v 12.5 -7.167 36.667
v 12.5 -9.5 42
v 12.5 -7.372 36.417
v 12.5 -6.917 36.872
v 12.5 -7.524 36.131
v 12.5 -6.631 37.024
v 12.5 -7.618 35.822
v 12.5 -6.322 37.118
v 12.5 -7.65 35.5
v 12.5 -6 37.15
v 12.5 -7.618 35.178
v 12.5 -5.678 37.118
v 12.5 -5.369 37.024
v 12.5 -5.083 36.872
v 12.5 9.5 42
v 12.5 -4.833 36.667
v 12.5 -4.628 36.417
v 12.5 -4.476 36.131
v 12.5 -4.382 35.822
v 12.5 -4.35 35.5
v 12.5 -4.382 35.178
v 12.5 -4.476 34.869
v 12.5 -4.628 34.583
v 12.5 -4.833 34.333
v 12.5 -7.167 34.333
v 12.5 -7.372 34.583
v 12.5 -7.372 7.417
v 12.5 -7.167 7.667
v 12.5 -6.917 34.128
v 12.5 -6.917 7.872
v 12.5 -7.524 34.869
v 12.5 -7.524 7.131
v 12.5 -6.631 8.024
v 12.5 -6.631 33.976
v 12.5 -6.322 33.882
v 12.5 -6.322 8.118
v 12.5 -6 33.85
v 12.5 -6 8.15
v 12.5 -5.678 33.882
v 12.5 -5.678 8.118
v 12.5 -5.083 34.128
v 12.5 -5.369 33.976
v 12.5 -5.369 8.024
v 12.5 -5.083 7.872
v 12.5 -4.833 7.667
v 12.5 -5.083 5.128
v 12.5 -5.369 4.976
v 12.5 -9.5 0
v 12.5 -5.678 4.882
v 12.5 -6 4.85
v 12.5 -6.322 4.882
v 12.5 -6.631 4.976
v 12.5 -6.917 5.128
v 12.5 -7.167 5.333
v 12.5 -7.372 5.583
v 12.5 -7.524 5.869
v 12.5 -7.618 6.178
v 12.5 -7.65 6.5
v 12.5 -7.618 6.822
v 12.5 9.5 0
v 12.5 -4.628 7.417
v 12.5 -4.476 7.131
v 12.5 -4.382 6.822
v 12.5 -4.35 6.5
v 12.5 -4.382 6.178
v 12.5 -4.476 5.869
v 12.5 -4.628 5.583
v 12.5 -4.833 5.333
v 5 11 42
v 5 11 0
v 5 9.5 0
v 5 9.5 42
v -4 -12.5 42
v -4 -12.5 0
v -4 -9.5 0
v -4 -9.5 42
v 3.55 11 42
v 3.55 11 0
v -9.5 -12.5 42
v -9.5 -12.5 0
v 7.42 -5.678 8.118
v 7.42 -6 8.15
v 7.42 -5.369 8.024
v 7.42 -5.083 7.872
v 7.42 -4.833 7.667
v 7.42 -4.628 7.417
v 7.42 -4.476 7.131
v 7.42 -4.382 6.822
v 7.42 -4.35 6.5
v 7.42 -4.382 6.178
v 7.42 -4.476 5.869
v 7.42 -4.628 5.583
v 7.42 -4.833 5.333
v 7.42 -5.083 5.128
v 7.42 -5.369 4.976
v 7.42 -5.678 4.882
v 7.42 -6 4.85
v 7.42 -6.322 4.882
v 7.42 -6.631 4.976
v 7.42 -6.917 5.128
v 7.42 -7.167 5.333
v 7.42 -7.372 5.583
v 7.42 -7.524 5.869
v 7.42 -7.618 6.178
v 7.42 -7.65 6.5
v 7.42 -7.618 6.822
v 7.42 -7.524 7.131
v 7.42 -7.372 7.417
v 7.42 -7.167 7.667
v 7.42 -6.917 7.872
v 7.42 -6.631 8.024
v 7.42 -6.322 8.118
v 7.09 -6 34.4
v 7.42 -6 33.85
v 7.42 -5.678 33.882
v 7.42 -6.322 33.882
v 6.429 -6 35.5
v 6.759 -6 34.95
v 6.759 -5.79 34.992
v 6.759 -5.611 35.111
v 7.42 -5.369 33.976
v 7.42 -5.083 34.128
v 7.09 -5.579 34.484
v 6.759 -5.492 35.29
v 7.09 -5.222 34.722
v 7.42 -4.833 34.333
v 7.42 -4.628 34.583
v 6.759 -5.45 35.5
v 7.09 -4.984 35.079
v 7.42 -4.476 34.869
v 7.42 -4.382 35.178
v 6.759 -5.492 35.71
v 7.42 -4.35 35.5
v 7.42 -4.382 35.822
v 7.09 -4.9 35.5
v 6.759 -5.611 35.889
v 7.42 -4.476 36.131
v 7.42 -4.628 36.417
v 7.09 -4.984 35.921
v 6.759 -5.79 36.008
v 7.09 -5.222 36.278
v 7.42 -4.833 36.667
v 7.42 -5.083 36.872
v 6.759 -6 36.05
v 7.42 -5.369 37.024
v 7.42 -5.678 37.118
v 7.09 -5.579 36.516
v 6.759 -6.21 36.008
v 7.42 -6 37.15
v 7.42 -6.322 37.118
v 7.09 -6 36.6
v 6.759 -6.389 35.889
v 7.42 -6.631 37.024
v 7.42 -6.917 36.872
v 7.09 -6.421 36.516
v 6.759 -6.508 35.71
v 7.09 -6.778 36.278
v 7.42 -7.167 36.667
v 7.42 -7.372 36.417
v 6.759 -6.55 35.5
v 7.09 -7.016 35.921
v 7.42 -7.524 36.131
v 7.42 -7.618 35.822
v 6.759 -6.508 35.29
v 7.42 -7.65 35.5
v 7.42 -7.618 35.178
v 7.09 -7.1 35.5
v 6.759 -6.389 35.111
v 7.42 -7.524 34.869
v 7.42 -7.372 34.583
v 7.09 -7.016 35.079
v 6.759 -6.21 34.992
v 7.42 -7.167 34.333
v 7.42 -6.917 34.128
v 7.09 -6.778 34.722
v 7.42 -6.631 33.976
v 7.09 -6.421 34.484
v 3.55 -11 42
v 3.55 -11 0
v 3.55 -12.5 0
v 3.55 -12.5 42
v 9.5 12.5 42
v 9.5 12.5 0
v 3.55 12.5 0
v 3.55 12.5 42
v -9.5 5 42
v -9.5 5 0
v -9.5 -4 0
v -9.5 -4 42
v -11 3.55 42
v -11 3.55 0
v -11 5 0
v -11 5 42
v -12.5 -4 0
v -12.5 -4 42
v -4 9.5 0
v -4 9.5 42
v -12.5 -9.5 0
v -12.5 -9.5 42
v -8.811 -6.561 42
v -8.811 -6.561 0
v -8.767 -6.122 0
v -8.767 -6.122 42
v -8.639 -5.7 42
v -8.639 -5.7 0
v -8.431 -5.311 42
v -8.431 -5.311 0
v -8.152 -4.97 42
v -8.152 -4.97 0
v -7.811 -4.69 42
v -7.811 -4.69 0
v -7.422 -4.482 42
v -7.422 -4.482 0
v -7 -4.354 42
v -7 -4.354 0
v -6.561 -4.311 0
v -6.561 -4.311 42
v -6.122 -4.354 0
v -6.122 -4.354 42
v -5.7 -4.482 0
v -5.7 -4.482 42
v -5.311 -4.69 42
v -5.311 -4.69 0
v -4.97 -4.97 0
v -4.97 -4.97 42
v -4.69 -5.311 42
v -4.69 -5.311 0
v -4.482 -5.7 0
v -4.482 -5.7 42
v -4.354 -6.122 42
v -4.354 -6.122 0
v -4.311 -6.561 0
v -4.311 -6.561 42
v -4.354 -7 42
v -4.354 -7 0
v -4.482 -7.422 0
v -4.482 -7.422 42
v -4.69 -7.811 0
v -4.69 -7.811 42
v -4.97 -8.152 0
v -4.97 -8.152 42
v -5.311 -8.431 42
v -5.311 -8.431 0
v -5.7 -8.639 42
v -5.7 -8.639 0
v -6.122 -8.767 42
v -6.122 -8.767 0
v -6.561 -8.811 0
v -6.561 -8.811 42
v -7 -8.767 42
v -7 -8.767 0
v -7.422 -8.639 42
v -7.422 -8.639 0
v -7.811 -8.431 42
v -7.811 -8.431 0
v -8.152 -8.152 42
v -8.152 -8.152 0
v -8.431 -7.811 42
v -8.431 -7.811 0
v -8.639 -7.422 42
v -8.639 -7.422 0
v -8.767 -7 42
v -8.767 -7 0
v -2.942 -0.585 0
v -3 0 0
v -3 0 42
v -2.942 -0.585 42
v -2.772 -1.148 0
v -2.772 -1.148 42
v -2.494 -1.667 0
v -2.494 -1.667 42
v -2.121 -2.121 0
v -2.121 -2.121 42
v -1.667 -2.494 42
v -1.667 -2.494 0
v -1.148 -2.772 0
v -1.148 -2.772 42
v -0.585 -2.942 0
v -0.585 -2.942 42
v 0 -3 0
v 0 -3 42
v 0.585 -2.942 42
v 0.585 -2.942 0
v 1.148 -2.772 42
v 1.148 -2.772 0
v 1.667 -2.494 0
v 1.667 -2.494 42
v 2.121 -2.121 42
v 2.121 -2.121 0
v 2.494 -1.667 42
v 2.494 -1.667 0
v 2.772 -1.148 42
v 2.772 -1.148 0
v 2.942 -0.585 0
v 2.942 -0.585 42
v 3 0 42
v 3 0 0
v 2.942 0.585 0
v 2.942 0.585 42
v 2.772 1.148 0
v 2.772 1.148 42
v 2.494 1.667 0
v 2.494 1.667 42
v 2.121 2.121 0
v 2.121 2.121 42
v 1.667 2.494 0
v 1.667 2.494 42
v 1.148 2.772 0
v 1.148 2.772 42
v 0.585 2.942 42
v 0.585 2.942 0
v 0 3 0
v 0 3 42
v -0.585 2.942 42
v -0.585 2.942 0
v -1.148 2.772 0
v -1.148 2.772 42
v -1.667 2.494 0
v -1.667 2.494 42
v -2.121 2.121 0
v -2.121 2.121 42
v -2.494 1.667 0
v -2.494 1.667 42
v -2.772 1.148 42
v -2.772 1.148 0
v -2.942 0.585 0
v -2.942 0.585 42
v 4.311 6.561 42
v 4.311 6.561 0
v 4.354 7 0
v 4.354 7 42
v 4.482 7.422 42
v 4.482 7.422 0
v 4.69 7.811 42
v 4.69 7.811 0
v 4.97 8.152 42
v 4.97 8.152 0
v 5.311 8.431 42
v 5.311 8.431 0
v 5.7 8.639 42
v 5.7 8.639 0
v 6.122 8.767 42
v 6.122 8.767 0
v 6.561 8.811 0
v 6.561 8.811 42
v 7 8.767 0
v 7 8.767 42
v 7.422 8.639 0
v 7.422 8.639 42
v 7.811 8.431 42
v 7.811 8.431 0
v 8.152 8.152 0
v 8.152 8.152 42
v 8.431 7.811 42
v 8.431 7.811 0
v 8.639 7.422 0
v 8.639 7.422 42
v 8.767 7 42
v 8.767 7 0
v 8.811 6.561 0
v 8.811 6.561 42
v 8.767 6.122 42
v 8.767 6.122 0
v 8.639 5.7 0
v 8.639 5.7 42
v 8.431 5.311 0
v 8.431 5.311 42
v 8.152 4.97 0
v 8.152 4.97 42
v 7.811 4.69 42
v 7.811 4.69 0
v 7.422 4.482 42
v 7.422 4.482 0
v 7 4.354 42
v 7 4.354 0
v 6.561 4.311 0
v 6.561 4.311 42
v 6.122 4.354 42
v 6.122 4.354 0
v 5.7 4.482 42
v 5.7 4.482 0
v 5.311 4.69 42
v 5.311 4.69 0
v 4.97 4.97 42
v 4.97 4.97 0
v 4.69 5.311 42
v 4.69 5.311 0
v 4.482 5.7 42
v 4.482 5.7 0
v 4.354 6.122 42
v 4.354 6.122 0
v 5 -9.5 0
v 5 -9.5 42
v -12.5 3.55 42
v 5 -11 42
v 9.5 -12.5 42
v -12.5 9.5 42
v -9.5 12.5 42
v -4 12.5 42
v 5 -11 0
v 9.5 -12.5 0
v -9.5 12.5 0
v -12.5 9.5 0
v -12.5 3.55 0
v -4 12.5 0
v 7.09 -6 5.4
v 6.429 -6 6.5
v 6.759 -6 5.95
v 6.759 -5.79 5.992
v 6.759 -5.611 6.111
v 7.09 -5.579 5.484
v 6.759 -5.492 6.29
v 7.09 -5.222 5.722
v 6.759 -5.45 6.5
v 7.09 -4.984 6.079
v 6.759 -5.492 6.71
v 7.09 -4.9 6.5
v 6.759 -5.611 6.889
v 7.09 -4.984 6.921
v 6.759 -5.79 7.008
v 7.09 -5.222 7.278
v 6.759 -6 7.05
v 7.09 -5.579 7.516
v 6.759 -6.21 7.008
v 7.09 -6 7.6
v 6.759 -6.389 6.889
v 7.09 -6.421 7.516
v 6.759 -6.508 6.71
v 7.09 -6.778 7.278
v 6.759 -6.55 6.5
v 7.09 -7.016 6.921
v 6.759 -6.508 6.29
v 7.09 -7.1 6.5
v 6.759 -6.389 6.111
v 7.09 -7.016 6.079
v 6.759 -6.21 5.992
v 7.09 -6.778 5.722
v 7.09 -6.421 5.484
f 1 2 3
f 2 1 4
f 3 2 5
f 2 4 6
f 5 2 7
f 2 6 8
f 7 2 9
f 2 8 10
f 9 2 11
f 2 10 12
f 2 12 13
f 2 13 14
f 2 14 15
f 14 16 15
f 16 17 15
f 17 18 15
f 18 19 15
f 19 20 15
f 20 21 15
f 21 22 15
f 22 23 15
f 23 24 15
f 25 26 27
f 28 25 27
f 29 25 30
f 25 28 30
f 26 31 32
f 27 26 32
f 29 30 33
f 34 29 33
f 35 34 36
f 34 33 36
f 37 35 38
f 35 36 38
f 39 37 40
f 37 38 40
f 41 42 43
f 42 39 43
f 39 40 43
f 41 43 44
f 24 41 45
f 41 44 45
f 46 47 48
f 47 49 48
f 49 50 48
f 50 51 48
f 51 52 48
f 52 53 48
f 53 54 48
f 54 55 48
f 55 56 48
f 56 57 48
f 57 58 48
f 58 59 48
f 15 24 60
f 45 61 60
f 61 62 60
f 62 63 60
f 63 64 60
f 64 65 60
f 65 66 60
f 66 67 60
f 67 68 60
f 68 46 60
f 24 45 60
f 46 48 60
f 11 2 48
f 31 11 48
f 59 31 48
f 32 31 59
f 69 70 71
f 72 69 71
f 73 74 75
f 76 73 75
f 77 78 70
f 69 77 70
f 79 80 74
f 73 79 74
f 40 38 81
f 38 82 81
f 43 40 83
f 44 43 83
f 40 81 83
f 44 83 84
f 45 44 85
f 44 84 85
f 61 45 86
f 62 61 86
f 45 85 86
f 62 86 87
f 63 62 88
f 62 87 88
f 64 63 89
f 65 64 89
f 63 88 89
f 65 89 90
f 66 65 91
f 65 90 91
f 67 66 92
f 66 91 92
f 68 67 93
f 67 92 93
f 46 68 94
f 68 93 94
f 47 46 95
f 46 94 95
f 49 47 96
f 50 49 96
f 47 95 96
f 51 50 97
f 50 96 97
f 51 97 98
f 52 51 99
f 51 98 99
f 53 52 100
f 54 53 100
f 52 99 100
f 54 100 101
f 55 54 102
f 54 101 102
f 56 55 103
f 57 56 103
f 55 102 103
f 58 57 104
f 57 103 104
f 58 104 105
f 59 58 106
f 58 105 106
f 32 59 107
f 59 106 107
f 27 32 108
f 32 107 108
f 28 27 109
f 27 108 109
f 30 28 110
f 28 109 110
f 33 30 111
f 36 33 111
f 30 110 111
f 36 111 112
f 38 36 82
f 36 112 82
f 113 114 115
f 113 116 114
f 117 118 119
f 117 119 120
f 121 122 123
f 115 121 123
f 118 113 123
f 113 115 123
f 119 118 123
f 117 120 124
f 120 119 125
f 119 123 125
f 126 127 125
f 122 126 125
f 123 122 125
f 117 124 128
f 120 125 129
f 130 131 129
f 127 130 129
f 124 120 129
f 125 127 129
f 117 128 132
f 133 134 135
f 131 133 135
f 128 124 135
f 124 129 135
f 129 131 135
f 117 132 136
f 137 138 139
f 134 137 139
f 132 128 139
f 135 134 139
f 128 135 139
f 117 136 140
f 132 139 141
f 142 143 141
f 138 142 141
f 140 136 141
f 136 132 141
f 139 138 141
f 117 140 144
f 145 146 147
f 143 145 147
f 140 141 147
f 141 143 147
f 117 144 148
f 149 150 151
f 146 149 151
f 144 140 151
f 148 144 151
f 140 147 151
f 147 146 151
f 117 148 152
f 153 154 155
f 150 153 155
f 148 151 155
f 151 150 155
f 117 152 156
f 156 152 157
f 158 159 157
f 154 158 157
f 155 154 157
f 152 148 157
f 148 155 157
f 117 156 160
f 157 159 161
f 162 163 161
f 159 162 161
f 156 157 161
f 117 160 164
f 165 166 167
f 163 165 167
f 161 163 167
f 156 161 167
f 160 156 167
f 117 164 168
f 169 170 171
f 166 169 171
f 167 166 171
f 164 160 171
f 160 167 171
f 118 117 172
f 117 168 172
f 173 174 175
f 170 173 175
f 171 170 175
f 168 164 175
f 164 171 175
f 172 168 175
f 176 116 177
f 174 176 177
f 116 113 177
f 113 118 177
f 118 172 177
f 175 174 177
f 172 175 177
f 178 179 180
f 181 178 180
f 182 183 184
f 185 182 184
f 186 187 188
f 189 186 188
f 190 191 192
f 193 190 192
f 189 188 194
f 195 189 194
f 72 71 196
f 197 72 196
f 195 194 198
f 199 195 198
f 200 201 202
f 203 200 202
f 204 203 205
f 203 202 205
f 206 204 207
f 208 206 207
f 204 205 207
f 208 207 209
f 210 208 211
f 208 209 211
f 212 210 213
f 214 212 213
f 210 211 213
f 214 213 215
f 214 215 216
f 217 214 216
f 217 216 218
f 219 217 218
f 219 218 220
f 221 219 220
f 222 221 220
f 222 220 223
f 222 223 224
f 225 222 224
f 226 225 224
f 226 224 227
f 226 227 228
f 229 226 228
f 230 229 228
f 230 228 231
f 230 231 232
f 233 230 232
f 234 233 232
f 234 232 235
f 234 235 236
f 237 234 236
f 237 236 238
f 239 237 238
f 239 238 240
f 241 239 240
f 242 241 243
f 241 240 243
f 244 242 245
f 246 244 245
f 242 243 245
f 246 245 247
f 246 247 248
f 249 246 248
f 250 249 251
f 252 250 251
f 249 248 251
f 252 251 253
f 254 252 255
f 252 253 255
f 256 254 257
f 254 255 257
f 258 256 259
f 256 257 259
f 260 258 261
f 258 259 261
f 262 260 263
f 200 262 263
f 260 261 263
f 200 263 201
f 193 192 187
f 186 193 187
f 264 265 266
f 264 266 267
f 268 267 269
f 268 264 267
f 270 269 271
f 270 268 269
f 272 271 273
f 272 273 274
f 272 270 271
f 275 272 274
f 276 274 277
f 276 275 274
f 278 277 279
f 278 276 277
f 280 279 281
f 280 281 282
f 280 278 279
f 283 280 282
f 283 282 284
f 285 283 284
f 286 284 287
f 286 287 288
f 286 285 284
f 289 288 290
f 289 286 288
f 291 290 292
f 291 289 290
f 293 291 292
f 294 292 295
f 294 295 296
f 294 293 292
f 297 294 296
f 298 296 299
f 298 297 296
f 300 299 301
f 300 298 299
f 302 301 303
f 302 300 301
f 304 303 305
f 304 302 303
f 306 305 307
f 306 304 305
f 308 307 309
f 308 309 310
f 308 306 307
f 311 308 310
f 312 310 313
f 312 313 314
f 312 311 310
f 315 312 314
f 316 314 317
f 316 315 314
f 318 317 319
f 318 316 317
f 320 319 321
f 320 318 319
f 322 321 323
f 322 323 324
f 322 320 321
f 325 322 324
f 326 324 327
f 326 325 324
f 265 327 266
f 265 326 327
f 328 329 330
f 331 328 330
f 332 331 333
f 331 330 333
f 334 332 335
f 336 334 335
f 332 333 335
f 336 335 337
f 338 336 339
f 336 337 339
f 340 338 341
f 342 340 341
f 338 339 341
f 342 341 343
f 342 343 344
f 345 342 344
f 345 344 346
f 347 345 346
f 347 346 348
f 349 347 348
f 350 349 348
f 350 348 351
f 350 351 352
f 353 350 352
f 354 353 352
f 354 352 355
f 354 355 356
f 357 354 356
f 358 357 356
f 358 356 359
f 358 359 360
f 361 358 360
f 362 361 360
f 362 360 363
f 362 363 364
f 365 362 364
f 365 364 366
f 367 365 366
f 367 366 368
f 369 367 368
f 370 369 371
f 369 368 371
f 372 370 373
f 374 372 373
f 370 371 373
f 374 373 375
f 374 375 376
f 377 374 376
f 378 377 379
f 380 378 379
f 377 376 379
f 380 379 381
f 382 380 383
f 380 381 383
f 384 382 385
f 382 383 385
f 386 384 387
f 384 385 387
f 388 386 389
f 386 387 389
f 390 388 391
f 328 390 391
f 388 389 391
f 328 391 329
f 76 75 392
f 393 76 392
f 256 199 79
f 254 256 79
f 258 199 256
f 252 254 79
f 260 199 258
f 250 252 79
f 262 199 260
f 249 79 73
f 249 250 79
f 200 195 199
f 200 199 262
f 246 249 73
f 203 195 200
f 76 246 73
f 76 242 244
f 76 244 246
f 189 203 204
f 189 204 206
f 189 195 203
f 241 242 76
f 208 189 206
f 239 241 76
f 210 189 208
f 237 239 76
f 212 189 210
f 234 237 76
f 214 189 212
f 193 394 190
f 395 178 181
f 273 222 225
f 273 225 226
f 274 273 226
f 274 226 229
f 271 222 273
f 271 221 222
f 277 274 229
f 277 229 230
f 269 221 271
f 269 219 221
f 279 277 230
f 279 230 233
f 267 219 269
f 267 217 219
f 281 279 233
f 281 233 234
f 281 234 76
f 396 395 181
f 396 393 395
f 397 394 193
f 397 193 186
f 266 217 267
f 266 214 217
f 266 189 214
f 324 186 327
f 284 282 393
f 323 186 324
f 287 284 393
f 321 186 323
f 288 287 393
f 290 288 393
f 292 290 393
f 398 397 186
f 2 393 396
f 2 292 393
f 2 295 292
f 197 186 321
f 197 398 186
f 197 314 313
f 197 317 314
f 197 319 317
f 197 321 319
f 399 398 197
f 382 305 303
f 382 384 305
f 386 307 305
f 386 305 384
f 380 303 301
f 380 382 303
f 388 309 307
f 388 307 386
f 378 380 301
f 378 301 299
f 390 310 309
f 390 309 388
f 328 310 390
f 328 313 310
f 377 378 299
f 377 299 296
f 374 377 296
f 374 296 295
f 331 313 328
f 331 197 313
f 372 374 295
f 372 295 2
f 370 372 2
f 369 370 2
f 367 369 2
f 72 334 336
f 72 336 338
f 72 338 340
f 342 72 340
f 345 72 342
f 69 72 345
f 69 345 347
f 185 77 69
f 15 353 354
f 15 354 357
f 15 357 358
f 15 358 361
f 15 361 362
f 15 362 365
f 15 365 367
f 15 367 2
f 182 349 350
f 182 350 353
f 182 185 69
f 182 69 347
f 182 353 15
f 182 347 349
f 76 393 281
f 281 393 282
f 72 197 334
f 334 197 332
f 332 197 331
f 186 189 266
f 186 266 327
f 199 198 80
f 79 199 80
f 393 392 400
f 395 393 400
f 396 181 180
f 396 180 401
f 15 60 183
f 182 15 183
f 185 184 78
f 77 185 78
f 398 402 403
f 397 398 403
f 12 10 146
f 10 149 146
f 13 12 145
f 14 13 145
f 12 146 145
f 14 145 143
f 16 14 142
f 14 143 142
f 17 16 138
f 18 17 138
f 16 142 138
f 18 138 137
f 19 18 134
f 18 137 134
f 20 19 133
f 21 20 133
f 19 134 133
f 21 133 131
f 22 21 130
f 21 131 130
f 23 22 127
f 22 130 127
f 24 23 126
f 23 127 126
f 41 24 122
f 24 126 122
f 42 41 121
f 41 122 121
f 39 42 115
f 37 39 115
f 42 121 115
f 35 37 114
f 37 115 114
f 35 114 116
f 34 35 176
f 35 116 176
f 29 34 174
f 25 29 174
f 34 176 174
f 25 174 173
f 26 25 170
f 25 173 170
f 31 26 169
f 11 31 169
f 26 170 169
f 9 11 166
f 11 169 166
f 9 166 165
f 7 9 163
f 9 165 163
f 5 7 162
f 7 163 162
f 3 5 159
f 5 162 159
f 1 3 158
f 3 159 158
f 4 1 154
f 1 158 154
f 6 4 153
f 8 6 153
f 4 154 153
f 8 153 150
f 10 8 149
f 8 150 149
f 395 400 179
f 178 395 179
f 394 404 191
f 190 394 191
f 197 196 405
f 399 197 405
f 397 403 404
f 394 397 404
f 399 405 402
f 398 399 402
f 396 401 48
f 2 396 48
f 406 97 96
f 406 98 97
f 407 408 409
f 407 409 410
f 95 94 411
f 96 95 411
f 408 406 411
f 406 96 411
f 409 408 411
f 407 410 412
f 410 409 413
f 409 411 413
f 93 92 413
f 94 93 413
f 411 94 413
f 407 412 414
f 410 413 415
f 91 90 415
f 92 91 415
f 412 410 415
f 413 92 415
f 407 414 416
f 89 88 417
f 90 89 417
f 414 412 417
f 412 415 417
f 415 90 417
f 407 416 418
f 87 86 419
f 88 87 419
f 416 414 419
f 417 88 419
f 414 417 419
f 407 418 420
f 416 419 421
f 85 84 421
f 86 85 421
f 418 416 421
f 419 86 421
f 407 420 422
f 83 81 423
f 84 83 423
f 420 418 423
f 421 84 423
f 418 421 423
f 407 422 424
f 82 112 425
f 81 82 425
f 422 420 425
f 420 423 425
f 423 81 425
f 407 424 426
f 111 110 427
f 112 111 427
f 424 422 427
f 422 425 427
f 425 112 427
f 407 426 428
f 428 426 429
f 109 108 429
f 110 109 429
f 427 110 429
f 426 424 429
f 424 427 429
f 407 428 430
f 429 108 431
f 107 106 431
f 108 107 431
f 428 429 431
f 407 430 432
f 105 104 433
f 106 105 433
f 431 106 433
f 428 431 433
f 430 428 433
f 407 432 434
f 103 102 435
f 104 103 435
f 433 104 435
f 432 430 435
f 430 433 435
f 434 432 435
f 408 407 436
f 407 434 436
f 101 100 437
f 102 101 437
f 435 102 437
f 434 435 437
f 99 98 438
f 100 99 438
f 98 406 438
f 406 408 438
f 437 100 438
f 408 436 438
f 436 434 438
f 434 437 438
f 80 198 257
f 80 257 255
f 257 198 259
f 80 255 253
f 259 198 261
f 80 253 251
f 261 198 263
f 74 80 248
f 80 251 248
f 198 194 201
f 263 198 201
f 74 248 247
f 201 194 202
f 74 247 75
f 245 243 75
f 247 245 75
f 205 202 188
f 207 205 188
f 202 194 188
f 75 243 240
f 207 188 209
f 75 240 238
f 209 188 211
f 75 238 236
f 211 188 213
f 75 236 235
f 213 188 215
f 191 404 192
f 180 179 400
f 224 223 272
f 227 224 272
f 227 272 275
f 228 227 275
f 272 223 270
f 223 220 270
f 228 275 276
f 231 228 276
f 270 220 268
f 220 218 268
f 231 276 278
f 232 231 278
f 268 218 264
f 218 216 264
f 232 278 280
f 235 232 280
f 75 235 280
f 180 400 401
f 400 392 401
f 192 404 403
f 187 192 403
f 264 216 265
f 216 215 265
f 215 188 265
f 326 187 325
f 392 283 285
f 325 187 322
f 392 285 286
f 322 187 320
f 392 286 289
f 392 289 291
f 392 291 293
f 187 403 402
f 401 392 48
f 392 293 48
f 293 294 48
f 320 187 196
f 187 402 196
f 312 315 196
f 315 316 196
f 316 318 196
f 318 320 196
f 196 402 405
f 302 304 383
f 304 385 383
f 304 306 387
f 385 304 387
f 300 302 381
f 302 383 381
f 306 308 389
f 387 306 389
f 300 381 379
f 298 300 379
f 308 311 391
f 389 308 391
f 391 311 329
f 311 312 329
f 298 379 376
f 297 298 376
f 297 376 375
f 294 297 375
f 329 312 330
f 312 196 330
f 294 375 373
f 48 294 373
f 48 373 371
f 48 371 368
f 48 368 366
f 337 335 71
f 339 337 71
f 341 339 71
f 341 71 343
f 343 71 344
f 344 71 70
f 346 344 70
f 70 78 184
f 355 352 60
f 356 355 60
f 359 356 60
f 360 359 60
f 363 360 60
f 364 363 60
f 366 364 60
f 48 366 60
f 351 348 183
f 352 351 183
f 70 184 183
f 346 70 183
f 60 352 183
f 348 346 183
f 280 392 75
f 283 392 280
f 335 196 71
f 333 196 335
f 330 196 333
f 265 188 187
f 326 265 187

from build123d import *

# Parameters (mm, degrees)
SKETCH1_R                       = 3
BOSS_EXTRUDE1_DEPTH             = 42
M4_CLEARANCE_HOLE1_D            = 4.5
TAP_DRILL_FOR_M4X0_7_TAP1_D     = 3.3
TAP_DRILL_FOR_M4X0_7_TAP1_DEPTH = 5.08
TAP_DRILL_FOR_M4X0_7_TAP1_TIP   = 0.991420021


with BuildPart() as part:
    # Sketch1 → Boss-Extrude1 (new body)
    with BuildSketch(Plane.XY):
        Polygon((-12.5, -9.5), (-9.5, -12.5), (-4, -12.5), (-4, -9.5), (5, -9.5), (5, -11), (3.55, -11), (3.55, -12.5), (9.5, -12.5), (12.5, -9.5), (12.5, 9.5), (9.5, 12.5), (3.55, 12.5), (3.55, 11), (5, 11), (5, 9.5), (-4, 9.5), (-4, 12.5), (-9.5, 12.5), (-12.5, 9.5), (-12.5, 3.55), (-11, 3.55), (-11, 5), (-9.5, 5), (-9.5, -4), (-12.5, -4), align=None)
        with Locations(Location((0, 0, 0), (0, 0, 180))):
            Circle(SKETCH1_R, mode=Mode.SUBTRACT)
    extrude(amount=BOSS_EXTRUDE1_DEPTH)

    # M4 Clearance Hole1 (through all)
    with Locations(Plane.XY.offset(42)):
        with Locations((6.560660172, 6.560660172), (-6.560660172, -6.560660172)):
            Hole(M4_CLEARANCE_HOLE1_D / 2)

    # Tap Drill for M4x0.7 Tap1
    with Locations(Plane(origin=(12.5, 0, 0), x_dir=(0, 0, -1), z_dir=(1, 0, 0))):
        with Locations((-35.5, -6), (-6.5, -6)):
            Hole(TAP_DRILL_FOR_M4X0_7_TAP1_D / 2, depth=TAP_DRILL_FOR_M4X0_7_TAP1_DEPTH)
            with Locations((0, 0, -(TAP_DRILL_FOR_M4X0_7_TAP1_DEPTH + TAP_DRILL_FOR_M4X0_7_TAP1_TIP / 2))):  # 118° drill point
                Cone(0, TAP_DRILL_FOR_M4X0_7_TAP1_D / 2, TAP_DRILL_FOR_M4X0_7_TAP1_TIP, mode=Mode.SUBTRACT)


solid = part.part
